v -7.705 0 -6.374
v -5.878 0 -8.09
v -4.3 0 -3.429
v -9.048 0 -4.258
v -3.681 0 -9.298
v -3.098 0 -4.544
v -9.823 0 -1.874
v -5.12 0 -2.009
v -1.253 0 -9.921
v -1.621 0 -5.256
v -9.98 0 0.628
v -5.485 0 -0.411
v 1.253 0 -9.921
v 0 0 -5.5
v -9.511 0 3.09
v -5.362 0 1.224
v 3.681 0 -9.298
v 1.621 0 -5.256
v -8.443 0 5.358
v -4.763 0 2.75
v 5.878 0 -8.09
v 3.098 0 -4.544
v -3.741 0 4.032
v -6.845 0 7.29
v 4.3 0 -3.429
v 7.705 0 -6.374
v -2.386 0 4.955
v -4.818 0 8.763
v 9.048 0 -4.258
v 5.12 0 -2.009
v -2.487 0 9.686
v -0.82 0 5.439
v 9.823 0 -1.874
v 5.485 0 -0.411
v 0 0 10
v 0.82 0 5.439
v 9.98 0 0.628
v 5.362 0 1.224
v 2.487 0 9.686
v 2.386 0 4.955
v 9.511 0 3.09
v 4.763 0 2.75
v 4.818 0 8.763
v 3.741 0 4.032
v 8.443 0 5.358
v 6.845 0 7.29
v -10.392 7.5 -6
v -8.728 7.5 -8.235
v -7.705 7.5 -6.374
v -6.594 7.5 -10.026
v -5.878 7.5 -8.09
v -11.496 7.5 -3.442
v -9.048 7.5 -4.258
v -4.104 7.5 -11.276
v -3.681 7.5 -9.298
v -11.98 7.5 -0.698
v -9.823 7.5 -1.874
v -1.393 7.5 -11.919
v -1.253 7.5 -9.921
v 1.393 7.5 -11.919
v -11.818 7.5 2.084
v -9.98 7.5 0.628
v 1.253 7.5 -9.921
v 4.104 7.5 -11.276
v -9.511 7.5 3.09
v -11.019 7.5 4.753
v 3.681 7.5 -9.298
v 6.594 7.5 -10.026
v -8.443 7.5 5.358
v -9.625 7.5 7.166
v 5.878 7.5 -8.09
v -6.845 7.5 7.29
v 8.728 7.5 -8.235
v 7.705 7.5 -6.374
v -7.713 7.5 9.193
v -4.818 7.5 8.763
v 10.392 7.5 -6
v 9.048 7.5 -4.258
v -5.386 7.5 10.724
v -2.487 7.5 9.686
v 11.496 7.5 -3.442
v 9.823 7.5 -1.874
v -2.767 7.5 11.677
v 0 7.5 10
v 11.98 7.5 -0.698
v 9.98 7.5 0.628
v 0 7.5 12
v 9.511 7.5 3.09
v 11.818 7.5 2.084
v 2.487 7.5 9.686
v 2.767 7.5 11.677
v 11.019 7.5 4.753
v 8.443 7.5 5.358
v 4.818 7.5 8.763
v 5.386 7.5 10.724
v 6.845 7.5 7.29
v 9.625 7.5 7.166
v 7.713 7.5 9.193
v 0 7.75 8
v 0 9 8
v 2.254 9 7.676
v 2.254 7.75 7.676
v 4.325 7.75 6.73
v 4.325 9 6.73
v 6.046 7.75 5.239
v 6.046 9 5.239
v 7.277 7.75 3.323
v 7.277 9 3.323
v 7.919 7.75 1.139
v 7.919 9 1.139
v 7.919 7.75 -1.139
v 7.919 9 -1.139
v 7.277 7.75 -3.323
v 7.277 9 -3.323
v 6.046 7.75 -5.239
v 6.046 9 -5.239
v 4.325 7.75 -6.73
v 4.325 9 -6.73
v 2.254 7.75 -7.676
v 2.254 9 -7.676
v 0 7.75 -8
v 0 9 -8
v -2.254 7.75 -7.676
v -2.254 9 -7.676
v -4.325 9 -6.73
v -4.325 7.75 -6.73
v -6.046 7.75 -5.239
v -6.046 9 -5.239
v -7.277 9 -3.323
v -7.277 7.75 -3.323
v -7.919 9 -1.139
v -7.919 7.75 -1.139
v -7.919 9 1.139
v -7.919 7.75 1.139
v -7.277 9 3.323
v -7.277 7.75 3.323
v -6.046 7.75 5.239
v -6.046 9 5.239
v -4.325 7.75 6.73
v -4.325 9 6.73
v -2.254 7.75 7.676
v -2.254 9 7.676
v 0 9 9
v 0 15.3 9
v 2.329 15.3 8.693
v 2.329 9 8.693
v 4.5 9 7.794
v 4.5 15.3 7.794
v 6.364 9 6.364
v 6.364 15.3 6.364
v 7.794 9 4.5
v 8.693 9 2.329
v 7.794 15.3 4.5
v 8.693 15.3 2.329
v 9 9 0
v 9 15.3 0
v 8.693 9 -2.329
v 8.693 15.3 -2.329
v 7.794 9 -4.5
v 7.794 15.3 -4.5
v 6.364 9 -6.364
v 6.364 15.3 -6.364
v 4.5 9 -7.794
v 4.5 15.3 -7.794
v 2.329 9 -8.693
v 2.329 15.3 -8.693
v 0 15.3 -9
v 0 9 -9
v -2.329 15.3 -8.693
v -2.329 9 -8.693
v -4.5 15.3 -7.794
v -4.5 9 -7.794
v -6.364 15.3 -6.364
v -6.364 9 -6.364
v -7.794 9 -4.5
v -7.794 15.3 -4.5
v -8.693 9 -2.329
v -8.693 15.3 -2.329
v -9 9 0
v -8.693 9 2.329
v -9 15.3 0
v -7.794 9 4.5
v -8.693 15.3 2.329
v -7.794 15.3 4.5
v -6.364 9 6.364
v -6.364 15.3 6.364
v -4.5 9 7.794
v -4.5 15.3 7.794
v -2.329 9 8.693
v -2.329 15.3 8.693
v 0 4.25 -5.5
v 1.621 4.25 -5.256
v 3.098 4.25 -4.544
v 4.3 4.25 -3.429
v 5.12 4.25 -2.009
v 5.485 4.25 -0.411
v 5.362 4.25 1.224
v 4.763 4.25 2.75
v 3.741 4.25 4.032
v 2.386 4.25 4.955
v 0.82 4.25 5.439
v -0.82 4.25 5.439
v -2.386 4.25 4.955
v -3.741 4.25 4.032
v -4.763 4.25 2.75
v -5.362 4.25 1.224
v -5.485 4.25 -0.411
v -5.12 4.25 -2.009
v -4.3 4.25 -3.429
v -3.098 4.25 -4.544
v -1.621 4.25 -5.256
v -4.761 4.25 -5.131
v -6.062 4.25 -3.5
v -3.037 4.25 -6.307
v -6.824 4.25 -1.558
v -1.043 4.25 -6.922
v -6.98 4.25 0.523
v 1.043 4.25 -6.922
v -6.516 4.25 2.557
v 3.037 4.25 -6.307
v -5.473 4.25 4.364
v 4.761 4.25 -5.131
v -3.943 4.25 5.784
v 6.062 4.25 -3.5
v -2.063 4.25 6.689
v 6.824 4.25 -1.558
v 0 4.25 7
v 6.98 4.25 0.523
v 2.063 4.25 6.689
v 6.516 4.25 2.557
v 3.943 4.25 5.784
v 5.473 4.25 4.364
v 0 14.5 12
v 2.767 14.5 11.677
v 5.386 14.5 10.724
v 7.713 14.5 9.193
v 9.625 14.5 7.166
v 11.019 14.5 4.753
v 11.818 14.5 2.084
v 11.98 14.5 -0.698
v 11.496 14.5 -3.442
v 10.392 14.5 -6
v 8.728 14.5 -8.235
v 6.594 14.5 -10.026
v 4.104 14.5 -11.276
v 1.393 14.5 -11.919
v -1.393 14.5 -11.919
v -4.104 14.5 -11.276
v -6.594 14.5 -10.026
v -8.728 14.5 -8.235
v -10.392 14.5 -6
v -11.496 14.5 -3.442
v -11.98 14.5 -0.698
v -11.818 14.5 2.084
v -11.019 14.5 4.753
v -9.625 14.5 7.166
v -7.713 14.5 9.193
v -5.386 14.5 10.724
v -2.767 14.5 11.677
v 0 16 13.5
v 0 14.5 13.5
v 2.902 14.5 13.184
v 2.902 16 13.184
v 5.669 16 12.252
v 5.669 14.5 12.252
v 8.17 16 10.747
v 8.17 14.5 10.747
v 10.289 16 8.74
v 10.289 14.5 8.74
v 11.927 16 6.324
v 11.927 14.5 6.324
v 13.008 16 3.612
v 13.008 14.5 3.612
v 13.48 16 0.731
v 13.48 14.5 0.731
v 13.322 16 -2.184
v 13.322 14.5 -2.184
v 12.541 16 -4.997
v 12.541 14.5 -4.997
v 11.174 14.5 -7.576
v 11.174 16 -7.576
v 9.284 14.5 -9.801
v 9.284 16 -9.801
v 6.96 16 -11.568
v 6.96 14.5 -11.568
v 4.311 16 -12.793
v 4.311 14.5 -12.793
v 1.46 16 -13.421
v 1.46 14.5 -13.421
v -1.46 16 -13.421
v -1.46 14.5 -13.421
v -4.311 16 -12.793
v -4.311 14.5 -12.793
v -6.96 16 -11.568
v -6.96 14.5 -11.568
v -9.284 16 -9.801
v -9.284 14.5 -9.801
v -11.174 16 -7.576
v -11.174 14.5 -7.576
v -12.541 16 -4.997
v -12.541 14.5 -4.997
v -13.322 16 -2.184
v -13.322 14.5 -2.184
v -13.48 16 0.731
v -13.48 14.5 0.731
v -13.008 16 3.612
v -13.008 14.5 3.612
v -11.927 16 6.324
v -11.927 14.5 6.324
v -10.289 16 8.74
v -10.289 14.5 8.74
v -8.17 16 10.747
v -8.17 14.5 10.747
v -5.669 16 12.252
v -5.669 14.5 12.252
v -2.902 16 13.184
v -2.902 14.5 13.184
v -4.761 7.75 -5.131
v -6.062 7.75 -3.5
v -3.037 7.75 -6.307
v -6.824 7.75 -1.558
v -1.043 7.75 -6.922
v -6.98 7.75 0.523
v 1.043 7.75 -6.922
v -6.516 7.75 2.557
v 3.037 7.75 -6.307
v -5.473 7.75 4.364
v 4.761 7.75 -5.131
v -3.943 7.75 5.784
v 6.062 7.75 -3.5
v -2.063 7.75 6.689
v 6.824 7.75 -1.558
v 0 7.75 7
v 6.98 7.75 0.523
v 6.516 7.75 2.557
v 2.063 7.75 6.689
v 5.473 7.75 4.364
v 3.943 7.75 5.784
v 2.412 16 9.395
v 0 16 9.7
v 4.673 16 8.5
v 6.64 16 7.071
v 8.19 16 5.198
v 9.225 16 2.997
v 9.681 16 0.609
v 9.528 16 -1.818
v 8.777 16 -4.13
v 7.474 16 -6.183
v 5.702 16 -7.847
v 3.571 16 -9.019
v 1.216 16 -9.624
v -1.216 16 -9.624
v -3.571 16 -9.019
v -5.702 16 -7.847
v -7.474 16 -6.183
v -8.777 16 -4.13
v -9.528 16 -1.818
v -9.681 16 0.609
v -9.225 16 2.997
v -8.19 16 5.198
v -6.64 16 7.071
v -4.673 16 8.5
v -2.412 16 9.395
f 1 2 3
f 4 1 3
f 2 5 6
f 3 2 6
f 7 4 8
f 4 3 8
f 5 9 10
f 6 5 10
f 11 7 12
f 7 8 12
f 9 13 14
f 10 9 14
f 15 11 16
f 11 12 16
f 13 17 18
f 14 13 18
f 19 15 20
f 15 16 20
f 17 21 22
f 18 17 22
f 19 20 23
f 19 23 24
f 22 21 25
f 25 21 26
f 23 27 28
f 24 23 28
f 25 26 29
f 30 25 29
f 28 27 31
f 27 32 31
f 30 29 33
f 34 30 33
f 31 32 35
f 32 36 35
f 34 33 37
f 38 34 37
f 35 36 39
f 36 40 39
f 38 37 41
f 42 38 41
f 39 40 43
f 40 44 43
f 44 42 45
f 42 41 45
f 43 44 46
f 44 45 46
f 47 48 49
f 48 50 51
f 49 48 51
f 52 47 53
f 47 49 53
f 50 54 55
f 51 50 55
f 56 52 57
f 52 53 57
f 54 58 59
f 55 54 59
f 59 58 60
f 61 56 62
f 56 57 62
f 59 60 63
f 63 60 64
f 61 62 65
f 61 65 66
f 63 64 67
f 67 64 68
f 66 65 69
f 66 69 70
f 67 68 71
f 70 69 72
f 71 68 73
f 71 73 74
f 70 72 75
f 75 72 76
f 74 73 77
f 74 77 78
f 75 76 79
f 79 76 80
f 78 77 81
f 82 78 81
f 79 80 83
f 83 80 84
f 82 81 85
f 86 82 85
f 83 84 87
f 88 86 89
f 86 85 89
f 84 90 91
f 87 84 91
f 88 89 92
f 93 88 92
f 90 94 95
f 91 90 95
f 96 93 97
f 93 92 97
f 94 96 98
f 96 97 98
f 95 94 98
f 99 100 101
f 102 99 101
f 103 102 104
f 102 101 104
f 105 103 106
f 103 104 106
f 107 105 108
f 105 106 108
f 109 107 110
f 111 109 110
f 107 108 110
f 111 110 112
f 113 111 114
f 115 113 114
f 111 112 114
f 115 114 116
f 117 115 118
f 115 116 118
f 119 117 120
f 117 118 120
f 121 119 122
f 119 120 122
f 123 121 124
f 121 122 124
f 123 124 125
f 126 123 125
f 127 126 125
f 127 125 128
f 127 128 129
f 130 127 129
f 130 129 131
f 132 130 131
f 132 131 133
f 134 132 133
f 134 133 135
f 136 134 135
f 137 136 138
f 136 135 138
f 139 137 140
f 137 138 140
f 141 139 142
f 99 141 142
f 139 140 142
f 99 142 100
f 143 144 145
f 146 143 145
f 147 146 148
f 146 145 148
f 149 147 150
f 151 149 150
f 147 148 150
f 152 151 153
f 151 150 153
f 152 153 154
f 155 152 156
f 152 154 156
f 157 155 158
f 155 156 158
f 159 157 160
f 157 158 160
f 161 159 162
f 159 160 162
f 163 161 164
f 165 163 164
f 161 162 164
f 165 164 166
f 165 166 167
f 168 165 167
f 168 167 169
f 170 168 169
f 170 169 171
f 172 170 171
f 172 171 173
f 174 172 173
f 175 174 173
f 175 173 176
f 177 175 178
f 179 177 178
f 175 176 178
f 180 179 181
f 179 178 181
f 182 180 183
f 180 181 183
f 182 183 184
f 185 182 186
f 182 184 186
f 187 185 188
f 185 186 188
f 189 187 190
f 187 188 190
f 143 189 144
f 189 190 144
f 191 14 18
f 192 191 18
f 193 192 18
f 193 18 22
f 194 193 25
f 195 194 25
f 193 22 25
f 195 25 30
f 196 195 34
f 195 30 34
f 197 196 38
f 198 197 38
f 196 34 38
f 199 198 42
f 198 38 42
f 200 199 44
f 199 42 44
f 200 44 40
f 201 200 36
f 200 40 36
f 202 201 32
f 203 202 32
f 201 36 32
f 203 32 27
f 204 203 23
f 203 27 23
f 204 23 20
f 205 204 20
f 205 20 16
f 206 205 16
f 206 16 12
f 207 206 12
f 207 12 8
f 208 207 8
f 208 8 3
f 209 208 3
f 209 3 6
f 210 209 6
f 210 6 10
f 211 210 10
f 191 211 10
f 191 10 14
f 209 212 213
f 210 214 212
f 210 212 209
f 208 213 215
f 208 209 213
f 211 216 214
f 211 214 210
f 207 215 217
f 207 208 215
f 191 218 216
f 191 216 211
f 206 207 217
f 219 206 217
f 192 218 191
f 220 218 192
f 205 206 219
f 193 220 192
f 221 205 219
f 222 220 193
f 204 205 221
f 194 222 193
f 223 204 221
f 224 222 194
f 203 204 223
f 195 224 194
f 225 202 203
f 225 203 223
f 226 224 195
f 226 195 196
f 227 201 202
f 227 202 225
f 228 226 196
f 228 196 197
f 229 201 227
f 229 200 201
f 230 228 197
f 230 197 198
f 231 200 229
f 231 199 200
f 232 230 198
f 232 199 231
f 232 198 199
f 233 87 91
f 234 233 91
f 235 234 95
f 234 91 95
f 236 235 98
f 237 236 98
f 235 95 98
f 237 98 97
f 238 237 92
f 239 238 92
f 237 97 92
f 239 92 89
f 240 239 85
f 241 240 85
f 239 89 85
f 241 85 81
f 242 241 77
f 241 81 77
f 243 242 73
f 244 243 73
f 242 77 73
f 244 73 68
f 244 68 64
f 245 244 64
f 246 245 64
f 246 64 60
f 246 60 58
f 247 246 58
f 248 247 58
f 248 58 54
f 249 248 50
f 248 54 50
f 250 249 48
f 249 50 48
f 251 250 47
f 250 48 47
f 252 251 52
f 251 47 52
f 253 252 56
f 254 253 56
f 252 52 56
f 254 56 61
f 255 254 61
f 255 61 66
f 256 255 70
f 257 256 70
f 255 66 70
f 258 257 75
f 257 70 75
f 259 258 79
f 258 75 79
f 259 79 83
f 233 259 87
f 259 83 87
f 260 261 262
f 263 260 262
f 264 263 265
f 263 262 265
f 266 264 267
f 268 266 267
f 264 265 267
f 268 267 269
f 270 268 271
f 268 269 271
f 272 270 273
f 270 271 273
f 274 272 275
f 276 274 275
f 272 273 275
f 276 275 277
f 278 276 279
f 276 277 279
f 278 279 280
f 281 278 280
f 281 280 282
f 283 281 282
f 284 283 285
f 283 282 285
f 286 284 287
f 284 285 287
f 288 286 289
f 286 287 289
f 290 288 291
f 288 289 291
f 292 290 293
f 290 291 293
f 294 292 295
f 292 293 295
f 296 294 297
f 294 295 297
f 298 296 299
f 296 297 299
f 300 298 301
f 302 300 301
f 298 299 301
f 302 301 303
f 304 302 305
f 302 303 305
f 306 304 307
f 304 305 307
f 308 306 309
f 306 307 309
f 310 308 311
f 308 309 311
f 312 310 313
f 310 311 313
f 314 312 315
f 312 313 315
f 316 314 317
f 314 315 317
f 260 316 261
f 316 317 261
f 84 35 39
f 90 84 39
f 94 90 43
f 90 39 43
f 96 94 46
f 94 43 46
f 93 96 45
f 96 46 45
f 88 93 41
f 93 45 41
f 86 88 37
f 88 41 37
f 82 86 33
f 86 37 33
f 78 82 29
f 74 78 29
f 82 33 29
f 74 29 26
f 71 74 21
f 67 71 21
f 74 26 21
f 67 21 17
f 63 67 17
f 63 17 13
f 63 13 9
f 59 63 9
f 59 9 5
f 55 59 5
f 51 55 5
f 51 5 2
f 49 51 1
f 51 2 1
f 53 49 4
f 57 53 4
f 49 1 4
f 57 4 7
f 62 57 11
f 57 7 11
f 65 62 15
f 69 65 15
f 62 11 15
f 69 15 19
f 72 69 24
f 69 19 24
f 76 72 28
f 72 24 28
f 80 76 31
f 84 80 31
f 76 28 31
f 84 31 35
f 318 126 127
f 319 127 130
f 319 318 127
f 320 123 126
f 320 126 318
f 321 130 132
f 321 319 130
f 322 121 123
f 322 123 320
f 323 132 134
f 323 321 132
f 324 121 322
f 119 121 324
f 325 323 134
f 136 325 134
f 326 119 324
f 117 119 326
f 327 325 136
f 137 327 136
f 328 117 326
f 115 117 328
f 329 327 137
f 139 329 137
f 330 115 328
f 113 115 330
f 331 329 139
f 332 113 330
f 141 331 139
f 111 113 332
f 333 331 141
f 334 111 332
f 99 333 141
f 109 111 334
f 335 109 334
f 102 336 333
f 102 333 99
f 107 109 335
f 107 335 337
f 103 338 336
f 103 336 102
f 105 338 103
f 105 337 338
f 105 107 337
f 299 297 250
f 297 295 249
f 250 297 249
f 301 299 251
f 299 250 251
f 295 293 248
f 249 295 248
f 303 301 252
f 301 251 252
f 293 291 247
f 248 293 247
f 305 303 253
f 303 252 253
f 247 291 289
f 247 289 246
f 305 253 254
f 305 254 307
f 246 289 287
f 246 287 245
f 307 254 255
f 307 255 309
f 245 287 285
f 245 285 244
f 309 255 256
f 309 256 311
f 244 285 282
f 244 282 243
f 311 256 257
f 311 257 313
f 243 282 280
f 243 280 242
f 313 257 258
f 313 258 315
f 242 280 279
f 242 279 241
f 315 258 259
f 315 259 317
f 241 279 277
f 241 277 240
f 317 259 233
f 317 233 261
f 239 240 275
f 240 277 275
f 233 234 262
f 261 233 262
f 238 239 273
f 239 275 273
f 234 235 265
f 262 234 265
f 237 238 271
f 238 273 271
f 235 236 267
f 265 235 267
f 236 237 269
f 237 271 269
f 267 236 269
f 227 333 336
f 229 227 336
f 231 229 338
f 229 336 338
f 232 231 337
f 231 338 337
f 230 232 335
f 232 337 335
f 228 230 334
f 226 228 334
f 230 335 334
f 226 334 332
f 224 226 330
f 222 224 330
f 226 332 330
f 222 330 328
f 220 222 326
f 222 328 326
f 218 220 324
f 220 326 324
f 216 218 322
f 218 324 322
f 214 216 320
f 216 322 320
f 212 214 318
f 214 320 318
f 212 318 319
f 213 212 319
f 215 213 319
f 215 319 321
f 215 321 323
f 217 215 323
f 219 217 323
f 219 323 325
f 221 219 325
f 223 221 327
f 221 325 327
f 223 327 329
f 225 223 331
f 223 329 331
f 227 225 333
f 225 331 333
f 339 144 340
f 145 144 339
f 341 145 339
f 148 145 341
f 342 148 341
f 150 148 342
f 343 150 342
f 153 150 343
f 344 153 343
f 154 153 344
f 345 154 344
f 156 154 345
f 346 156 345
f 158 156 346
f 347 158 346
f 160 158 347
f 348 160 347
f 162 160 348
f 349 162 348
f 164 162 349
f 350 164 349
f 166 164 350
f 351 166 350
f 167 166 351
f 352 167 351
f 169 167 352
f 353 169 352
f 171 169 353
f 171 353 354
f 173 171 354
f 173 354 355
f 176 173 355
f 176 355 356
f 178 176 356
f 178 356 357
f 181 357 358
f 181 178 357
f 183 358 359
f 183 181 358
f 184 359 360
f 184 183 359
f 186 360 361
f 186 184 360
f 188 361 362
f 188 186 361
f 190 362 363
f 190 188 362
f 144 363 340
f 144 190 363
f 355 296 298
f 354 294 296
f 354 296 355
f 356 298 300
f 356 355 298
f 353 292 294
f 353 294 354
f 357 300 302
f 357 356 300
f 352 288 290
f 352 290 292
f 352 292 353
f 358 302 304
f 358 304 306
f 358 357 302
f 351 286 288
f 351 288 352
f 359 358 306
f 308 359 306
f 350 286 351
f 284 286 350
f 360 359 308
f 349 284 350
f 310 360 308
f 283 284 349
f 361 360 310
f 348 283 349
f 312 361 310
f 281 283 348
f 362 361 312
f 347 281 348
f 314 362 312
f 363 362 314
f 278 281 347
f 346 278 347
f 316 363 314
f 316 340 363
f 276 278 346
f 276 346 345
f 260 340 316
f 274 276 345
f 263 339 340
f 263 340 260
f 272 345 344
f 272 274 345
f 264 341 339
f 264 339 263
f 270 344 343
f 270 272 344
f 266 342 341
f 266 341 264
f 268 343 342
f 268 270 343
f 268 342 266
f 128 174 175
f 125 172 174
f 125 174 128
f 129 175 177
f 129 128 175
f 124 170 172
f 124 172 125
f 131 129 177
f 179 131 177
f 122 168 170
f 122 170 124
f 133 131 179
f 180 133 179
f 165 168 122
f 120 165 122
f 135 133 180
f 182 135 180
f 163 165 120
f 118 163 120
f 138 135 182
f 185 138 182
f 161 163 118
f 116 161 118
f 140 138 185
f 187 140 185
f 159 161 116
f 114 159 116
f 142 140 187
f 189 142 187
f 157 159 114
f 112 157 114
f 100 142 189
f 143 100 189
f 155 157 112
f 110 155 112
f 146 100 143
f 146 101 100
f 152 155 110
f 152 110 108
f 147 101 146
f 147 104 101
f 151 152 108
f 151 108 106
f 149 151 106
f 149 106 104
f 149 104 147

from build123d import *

# Parameters (mm, degrees)
ESQUISSE2_R             = 10
BOSS_EXTRU_1_DEPTH      = 7.5
ESQUISSE3_R             = 12
BOSS_EXTRU_2_DEPTH      = 7
ESQUISSE4_R             = 13.5
BOSS_EXTRU_3_DEPTH      = 1.5
ESQUISSE7_R             = 5.5
ENL_V_MAT_EXTRU_1_DEPTH = 21.5
ESQUISSE8_R             = 9
ENL_V_MAT_EXTRU_2_DEPTH = 7
CHANFREIN1_SIZE         = 0.7
ESQUISSE9_R             = 8
ENL_V_MAT_EXTRU_3_DEPTH = 1.25
ESQUISSE10_R            = 7
ENL_V_MAT_EXTRU_4_DEPTH = 3.5


with BuildPart() as part:
    # Esquisse2 → Boss.-Extru.1 (new body)
    with BuildSketch(Plane(origin=(0, 0, 0), x_dir=(1, 0, 0), z_dir=(0, 1, 0))):
        with Locations(Location((0, 0, 0), (0, 0, 270))):
            Circle(ESQUISSE2_R)
    extrude(amount=BOSS_EXTRU_1_DEPTH)

    # Esquisse3 → Boss.-Extru.2 (add)
    with BuildSketch(Plane(origin=(0, 7.5, 0), x_dir=(1, 0, 0), z_dir=(0, 1, 0))):
        with Locations(Location((0, 0, 0), (0, 0, 270))):
            Circle(ESQUISSE3_R)
    extrude(amount=BOSS_EXTRU_2_DEPTH)

    # Esquisse4 → Boss.-Extru.3 (add)
    with BuildSketch(Plane(origin=(0, 14.5, 0), x_dir=(1, 0, 0), z_dir=(0, 1, 0))):
        with Locations(Location((0, 0, 0), (0, 0, 270))):
            Circle(ESQUISSE4_R)
    extrude(amount=BOSS_EXTRU_3_DEPTH)

    # Esquisse7 → Enlèv. mat.-Extru.1 (cut)
    with BuildSketch(Plane.XZ):
        with Locations(Location((0, 0, 0), (0, 0, 270))):
            Circle(ESQUISSE7_R)
    extrude(amount=-ENL_V_MAT_EXTRU_1_DEPTH, mode=Mode.SUBTRACT)

    # Esquisse8 → Enlèv. mat.-Extru.2 (cut)
    with BuildSketch(Plane(origin=(0, 16, 0), x_dir=(1, 0, 0), z_dir=(0, 1, 0))):
        with Locations(Location((0, 0, 0), (0, 0, 270))):
            Circle(ESQUISSE8_R)
    extrude(amount=-ENL_V_MAT_EXTRU_2_DEPTH, mode=Mode.SUBTRACT)

    # Chanfrein1
    chanfrein1_edges = [part.edges().sort_by_distance(p)[0] for p in [
        (0, 16, -9),
    ]]
    chamfer(chanfrein1_edges, length=CHANFREIN1_SIZE)

    # Esquisse9 → Enlèv. mat.-Extru.3 (cut)
    with BuildSketch(Plane(origin=(0, 9, 0), x_dir=(1, 0, 0), z_dir=(0, 1, 0))):
        with Locations(Location((0, 0, 0), (0, 0, 270))):
            Circle(ESQUISSE9_R)
    extrude(amount=-ENL_V_MAT_EXTRU_3_DEPTH, mode=Mode.SUBTRACT)

    # Esquisse10 → Enlèv. mat.-Extru.4 (cut)
    with BuildSketch(Plane(origin=(0, 7.75, 0), x_dir=(1, 0, 0), z_dir=(0, 1, 0))):
        with Locations(Location((0, 0, 0), (0, 0, 270))):
            Circle(ESQUISSE10_R)
    extrude(amount=-ENL_V_MAT_EXTRU_4_DEPTH, mode=Mode.SUBTRACT)


solid = part.part
